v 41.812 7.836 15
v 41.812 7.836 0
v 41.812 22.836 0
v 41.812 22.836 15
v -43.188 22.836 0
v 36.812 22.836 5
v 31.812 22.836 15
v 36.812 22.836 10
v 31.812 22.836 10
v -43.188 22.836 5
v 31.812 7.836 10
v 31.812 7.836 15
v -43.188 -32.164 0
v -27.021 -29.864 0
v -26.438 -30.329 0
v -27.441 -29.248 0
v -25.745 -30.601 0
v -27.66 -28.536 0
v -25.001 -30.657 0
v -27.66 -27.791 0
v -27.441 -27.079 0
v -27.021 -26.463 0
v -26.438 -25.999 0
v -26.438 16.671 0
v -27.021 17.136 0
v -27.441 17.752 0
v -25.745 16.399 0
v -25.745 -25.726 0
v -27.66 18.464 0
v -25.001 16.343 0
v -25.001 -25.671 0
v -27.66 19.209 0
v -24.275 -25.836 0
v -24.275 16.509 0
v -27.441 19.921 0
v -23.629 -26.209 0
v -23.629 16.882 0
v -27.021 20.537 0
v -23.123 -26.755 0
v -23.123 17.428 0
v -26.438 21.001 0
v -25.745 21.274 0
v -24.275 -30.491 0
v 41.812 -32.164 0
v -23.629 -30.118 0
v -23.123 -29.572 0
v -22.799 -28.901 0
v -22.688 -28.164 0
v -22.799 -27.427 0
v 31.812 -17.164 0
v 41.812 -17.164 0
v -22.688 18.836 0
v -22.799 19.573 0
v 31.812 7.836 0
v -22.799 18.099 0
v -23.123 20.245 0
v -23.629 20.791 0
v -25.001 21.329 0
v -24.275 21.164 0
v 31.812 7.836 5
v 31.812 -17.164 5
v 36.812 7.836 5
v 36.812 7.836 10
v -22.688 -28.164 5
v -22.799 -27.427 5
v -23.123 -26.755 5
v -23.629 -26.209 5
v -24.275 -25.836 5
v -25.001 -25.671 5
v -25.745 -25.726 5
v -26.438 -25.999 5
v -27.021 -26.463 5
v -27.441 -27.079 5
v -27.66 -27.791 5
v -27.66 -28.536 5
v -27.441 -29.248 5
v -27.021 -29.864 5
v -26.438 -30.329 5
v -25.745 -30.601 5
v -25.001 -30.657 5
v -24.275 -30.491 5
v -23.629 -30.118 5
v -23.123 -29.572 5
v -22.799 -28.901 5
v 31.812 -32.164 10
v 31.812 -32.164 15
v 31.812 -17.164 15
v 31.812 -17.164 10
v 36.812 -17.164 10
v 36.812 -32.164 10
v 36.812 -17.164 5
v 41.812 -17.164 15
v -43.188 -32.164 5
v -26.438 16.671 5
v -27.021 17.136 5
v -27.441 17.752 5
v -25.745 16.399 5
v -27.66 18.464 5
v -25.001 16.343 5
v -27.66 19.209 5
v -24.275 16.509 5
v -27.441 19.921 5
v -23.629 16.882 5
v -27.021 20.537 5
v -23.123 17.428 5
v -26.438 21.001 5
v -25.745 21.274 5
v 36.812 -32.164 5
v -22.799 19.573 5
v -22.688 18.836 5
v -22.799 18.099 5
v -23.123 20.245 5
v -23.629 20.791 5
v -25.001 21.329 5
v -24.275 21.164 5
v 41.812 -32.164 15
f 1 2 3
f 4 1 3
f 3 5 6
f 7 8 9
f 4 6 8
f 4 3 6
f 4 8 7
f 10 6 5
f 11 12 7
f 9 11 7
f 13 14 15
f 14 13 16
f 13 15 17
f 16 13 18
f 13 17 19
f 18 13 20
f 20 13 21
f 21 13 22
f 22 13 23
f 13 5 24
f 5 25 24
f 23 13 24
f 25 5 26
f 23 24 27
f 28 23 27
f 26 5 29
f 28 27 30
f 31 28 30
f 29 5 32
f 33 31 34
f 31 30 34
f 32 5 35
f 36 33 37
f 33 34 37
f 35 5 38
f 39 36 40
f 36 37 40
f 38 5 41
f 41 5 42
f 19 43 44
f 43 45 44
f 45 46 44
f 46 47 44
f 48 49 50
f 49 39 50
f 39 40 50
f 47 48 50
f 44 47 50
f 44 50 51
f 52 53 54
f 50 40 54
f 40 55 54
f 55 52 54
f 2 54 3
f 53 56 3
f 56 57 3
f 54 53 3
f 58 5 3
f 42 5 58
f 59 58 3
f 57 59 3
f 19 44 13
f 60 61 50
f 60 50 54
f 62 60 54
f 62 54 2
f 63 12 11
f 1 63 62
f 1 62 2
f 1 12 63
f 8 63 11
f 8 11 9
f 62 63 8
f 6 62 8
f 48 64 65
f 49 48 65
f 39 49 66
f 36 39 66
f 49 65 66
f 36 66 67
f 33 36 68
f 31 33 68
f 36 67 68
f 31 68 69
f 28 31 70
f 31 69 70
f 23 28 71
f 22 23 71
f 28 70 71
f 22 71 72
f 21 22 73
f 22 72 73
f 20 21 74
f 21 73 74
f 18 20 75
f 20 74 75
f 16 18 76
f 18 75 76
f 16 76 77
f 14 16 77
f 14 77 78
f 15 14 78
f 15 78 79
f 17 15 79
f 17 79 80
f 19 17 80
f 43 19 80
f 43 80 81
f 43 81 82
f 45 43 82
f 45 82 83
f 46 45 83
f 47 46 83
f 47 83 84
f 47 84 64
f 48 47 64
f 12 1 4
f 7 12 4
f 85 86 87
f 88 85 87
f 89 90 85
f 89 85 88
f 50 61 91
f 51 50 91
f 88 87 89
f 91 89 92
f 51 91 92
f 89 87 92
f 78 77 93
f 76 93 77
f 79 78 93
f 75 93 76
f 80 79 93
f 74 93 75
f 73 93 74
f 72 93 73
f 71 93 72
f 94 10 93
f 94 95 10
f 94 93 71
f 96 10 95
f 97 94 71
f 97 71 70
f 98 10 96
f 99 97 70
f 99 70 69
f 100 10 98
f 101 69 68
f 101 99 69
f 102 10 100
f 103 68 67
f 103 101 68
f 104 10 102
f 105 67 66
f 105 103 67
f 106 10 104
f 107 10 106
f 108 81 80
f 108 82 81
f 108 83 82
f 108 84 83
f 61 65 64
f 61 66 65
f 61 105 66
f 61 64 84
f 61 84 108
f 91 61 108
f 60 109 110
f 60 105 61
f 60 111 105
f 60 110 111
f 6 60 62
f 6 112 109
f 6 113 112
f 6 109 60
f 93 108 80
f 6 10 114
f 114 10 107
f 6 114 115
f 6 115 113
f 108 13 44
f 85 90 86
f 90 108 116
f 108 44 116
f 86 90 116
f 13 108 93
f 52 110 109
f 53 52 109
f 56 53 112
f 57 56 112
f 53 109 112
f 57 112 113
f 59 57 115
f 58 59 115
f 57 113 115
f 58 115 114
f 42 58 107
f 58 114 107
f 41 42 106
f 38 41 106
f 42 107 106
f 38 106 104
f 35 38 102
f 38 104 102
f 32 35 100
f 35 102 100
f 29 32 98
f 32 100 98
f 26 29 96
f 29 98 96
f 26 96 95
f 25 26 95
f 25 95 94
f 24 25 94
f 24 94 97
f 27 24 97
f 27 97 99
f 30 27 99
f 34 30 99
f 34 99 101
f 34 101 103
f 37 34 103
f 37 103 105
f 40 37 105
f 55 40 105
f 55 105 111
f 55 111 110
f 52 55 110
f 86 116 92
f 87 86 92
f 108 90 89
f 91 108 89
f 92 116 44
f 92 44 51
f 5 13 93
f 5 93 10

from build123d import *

# Parameters (mm, degrees)
F0_W     = 85
F0_H     = 55
F1_DEPTH = 5
F2_W     = 55
F2_H     = 10
F3_DEPTH = 5
F4_W     = 55
F4_H     = 5
F5_DEPTH = 10
F6_W     = 10
F6_H     = 25
F7_DEPTH = 23.6
F8_R     = 2.5
F9_DEPTH = 25


with BuildPart() as f1:
    # F0 (on Top) → F1 (new body)
    with BuildSketch(Plane.XY):
        with Locations((-0.6882026792, -4.6636614819)):
            Rectangle(F0_W, F0_H)
    extrude(amount=F1_DEPTH)

    # F2 (on face) → F3 (join)
    with BuildSketch(Plane.YZ.offset(41.8117973208)):
        with Locations((-4.6636614819, 5)):
            Rectangle(F2_W, F2_H)
    extrude(amount=-F3_DEPTH)

    # F4 (on face) → F5 (join)
    with BuildSketch(Plane.YZ.offset(41.8117973208)):
        with Locations((-4.6636614819, 12.5)):
            Rectangle(F4_W, F4_H)
    extrude(amount=-F5_DEPTH)

    # F6 (on face) → F7 (cut)
    with BuildSketch(Plane.XY.offset(15)):
        with Locations((36.8117973208, -4.6636614819)):
            Rectangle(F6_W, F6_H)
    extrude(amount=-F7_DEPTH, mode=Mode.SUBTRACT)

    # F8 (on face) → F9 (cut)
    with BuildSketch(Plane.XY.offset(5)):
        with Locations((-25.1882026792, -28.1636614819)):
            Circle(F8_R)
        with Locations((-25.1882026792, 18.8363385181)):
            Circle(F8_R)
    extrude(amount=-F9_DEPTH, mode=Mode.SUBTRACT)


solid = f1.part
